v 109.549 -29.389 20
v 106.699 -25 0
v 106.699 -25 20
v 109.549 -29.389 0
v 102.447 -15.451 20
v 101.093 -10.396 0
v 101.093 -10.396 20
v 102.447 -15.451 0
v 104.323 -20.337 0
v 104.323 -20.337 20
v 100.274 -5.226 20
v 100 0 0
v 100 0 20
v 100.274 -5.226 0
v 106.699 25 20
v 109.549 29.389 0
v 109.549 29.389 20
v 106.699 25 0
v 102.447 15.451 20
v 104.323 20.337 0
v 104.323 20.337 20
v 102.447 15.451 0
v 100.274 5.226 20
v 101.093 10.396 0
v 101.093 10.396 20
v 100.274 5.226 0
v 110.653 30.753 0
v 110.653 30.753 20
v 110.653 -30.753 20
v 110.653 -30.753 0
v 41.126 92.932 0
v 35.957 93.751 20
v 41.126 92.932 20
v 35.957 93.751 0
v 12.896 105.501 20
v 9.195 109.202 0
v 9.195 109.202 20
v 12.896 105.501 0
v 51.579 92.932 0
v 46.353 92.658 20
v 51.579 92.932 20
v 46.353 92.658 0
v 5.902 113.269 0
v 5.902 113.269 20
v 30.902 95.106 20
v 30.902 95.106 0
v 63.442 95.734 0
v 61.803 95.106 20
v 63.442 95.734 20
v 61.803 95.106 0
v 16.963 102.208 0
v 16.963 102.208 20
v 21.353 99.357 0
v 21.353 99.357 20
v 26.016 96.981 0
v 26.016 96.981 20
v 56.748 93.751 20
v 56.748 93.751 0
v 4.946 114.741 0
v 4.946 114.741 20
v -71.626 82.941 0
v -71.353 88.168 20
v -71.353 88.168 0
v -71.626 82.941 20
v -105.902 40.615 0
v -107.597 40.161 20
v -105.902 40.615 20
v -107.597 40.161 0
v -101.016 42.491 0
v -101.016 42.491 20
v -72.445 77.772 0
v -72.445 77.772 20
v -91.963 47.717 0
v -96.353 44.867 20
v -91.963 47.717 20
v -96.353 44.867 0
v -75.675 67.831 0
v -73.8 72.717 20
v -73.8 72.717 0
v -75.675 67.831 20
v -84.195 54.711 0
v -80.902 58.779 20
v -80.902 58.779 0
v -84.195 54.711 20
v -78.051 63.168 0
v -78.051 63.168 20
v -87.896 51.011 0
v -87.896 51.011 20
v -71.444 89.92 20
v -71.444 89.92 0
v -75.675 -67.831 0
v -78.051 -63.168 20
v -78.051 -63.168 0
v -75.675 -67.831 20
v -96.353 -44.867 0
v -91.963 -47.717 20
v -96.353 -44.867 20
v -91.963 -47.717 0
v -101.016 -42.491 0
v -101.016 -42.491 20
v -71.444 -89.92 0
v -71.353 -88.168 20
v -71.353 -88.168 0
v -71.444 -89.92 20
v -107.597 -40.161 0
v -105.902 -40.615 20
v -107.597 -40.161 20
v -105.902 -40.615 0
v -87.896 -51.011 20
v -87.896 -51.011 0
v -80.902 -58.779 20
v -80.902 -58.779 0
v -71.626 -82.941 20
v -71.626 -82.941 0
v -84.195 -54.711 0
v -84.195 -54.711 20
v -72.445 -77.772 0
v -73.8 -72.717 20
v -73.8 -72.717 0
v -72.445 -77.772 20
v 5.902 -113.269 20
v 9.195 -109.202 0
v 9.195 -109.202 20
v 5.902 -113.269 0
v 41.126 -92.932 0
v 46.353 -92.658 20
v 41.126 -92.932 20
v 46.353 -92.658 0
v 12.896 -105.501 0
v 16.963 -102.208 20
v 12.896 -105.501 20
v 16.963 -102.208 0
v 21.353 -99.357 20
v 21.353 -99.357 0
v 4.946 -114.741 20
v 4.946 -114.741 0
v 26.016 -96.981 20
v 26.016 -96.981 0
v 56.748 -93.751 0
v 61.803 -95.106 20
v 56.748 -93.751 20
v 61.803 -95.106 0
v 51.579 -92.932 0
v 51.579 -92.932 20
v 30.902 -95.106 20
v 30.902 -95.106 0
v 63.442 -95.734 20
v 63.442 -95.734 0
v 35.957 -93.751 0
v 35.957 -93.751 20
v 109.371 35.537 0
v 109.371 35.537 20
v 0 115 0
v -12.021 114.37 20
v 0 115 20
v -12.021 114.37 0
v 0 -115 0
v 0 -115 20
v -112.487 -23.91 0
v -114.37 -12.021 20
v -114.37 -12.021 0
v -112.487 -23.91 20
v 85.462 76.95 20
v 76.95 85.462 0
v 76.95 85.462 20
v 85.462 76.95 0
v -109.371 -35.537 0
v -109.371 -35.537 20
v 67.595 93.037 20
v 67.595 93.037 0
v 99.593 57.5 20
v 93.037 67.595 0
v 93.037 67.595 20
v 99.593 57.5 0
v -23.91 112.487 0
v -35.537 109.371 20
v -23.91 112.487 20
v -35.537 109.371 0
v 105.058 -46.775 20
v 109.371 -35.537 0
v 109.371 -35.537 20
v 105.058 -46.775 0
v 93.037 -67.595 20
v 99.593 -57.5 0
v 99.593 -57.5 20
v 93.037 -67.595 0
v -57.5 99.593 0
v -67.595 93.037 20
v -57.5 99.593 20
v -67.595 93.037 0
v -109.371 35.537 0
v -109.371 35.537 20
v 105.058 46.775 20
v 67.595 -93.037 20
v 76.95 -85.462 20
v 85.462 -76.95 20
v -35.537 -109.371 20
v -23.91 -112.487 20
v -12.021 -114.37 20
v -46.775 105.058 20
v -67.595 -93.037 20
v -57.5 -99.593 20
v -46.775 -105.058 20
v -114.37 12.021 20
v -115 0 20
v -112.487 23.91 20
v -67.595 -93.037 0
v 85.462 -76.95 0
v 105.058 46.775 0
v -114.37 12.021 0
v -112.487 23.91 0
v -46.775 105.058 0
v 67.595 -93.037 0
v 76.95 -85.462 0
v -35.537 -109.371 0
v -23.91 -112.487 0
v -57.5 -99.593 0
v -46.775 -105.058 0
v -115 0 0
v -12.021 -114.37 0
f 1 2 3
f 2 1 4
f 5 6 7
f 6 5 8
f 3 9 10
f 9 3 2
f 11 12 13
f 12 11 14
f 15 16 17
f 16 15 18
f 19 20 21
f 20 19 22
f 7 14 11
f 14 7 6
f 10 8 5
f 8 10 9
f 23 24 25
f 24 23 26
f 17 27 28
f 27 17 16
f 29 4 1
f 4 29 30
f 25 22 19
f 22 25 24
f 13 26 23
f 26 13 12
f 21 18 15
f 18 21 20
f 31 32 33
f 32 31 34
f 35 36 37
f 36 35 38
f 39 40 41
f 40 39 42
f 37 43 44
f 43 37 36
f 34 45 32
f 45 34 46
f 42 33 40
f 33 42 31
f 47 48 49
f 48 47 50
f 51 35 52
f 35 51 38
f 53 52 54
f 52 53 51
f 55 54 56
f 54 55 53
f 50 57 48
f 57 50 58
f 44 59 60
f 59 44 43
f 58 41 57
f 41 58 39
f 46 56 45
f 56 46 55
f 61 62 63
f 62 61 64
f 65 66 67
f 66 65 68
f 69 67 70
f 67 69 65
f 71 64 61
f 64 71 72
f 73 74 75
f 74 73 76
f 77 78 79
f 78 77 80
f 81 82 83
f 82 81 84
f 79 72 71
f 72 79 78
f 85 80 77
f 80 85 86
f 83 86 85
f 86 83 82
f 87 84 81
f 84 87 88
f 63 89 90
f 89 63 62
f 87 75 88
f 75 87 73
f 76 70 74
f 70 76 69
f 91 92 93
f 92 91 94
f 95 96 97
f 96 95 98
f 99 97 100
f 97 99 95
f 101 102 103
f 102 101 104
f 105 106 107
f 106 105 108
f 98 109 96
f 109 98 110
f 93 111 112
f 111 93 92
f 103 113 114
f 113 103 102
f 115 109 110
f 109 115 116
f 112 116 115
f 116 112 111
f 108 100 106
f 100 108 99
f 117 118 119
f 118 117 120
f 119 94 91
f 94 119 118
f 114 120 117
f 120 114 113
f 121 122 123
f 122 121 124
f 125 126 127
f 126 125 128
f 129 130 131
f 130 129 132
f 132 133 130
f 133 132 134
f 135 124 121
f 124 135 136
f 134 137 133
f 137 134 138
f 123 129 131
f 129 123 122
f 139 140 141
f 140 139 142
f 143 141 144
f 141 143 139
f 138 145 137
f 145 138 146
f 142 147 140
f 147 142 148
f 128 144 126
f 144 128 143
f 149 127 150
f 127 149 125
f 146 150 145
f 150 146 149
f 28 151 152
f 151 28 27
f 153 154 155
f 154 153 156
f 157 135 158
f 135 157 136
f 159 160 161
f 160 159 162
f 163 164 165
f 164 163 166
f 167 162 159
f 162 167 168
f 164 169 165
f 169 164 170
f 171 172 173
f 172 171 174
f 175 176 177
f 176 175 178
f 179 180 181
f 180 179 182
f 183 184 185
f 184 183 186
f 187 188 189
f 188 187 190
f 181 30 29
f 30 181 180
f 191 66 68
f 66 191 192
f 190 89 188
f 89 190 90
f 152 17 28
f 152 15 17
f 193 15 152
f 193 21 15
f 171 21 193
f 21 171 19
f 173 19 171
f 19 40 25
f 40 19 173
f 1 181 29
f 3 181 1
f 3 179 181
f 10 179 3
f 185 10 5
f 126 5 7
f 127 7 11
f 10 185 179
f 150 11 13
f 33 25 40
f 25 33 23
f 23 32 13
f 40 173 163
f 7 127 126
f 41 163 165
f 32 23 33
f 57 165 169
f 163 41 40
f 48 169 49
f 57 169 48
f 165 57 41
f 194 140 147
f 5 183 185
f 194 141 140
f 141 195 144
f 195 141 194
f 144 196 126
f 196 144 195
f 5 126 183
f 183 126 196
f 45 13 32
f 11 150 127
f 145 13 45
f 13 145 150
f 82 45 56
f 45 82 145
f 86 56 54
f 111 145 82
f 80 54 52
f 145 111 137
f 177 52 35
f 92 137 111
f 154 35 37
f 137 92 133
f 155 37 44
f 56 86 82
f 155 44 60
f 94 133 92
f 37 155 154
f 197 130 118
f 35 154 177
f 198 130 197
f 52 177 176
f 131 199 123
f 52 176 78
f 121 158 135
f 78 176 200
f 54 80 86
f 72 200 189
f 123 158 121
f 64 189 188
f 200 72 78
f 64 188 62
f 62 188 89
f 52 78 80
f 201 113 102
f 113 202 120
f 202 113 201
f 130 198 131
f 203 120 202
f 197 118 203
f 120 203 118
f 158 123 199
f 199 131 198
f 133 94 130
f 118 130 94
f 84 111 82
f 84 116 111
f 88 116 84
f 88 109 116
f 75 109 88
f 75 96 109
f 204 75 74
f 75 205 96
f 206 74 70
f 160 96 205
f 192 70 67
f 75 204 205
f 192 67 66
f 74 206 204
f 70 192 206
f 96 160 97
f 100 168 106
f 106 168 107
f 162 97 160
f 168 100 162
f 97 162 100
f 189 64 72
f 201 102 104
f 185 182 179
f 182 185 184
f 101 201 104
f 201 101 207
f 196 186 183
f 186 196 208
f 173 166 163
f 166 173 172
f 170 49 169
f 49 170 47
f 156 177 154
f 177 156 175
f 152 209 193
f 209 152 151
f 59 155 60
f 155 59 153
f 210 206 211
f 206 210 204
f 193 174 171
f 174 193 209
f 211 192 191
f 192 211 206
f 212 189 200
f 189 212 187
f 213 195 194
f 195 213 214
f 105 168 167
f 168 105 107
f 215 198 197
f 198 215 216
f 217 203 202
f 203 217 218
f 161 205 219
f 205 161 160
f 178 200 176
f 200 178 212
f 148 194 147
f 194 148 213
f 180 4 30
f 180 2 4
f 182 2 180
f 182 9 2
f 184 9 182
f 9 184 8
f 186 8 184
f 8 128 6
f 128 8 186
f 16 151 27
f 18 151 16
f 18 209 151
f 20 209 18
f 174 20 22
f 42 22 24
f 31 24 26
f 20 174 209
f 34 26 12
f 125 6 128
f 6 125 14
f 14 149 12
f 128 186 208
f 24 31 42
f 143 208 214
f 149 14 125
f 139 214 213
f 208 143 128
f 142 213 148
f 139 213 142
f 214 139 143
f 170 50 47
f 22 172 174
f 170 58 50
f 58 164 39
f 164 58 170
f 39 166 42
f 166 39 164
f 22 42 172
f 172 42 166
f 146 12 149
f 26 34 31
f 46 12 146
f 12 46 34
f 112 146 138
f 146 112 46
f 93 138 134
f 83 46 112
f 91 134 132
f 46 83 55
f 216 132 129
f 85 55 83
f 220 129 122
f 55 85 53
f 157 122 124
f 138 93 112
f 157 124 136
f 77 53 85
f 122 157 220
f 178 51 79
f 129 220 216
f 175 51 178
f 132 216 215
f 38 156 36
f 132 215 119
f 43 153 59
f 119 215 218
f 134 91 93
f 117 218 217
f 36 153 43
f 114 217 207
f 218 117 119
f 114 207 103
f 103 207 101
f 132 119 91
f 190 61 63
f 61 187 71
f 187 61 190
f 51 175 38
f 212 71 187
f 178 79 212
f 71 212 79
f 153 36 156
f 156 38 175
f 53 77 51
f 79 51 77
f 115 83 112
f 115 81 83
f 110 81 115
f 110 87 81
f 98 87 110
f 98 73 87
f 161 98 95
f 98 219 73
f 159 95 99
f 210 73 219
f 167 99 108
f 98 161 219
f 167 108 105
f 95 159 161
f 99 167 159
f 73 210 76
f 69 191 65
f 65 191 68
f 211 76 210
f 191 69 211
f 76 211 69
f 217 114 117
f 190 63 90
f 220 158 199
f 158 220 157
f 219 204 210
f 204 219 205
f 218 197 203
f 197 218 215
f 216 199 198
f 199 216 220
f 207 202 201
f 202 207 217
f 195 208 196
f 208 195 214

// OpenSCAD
wid    = 220;
dep    = 230;
botThk = 3;
botHt  = 30;
bevel  = 5;

$fn=60;

orangePos = [0,70,0];
module orange() {
   color("orange") translate([0,0,35]) sphere(r=35);
}

bittersPos = [-70,70,0];
module bitters() {
   color("blue") cylinder(r=22.5, h=100);
}

jiggerPos = [70,70,0];
module jigger() {
   color("grey") cylinder(r=25, h=60);
}

yetiPos = [60,-60,0];
module yeti() {
   color("grey") cylinder(r=45, h=80);
}

module base() {
   difference() {
      hull() {
         translate([-wid/2+bevel,-wid/2+bevel,0]) cylinder(r=bevel,h=botHt);
         translate([wid/2-bevel,-wid/2+bevel,0]) cylinder(r=bevel,h=botHt);
         translate([-wid/2+bevel,wid/2-bevel,0]) cylinder(r=bevel,h=botHt);
         translate([wid/2-bevel,wid/2-bevel,0]) cylinder(r=bevel,h=botHt);
      }

      translate([0,0,botThk]) {
         translate(orangePos) opening() orange();
         translate(bittersPos) opening() bitters();
         translate(jiggerPos) opening() jigger();
         translate(yetiPos) opening() yeti();
      }
   }
}

difference() {
   cylinder(d=230,h=20);
   for(i=[0:4]) rotate([0,0,(360/5)*i]) translate([150,0,-1]) cylinder(r=50,h=30);
}

module opening(scaleXY=1.05, openHeight=50) {
   linear_extrude(height=openHeight) scale([scaleXY,scaleXY,1]) projection()
      children();
}

// base();

if (0) {
   translate(orangePos) orange();
   translate(bittersPos) bitters();
   translate(jiggerPos) jigger();
   translate(yetiPos) yeti();
}
